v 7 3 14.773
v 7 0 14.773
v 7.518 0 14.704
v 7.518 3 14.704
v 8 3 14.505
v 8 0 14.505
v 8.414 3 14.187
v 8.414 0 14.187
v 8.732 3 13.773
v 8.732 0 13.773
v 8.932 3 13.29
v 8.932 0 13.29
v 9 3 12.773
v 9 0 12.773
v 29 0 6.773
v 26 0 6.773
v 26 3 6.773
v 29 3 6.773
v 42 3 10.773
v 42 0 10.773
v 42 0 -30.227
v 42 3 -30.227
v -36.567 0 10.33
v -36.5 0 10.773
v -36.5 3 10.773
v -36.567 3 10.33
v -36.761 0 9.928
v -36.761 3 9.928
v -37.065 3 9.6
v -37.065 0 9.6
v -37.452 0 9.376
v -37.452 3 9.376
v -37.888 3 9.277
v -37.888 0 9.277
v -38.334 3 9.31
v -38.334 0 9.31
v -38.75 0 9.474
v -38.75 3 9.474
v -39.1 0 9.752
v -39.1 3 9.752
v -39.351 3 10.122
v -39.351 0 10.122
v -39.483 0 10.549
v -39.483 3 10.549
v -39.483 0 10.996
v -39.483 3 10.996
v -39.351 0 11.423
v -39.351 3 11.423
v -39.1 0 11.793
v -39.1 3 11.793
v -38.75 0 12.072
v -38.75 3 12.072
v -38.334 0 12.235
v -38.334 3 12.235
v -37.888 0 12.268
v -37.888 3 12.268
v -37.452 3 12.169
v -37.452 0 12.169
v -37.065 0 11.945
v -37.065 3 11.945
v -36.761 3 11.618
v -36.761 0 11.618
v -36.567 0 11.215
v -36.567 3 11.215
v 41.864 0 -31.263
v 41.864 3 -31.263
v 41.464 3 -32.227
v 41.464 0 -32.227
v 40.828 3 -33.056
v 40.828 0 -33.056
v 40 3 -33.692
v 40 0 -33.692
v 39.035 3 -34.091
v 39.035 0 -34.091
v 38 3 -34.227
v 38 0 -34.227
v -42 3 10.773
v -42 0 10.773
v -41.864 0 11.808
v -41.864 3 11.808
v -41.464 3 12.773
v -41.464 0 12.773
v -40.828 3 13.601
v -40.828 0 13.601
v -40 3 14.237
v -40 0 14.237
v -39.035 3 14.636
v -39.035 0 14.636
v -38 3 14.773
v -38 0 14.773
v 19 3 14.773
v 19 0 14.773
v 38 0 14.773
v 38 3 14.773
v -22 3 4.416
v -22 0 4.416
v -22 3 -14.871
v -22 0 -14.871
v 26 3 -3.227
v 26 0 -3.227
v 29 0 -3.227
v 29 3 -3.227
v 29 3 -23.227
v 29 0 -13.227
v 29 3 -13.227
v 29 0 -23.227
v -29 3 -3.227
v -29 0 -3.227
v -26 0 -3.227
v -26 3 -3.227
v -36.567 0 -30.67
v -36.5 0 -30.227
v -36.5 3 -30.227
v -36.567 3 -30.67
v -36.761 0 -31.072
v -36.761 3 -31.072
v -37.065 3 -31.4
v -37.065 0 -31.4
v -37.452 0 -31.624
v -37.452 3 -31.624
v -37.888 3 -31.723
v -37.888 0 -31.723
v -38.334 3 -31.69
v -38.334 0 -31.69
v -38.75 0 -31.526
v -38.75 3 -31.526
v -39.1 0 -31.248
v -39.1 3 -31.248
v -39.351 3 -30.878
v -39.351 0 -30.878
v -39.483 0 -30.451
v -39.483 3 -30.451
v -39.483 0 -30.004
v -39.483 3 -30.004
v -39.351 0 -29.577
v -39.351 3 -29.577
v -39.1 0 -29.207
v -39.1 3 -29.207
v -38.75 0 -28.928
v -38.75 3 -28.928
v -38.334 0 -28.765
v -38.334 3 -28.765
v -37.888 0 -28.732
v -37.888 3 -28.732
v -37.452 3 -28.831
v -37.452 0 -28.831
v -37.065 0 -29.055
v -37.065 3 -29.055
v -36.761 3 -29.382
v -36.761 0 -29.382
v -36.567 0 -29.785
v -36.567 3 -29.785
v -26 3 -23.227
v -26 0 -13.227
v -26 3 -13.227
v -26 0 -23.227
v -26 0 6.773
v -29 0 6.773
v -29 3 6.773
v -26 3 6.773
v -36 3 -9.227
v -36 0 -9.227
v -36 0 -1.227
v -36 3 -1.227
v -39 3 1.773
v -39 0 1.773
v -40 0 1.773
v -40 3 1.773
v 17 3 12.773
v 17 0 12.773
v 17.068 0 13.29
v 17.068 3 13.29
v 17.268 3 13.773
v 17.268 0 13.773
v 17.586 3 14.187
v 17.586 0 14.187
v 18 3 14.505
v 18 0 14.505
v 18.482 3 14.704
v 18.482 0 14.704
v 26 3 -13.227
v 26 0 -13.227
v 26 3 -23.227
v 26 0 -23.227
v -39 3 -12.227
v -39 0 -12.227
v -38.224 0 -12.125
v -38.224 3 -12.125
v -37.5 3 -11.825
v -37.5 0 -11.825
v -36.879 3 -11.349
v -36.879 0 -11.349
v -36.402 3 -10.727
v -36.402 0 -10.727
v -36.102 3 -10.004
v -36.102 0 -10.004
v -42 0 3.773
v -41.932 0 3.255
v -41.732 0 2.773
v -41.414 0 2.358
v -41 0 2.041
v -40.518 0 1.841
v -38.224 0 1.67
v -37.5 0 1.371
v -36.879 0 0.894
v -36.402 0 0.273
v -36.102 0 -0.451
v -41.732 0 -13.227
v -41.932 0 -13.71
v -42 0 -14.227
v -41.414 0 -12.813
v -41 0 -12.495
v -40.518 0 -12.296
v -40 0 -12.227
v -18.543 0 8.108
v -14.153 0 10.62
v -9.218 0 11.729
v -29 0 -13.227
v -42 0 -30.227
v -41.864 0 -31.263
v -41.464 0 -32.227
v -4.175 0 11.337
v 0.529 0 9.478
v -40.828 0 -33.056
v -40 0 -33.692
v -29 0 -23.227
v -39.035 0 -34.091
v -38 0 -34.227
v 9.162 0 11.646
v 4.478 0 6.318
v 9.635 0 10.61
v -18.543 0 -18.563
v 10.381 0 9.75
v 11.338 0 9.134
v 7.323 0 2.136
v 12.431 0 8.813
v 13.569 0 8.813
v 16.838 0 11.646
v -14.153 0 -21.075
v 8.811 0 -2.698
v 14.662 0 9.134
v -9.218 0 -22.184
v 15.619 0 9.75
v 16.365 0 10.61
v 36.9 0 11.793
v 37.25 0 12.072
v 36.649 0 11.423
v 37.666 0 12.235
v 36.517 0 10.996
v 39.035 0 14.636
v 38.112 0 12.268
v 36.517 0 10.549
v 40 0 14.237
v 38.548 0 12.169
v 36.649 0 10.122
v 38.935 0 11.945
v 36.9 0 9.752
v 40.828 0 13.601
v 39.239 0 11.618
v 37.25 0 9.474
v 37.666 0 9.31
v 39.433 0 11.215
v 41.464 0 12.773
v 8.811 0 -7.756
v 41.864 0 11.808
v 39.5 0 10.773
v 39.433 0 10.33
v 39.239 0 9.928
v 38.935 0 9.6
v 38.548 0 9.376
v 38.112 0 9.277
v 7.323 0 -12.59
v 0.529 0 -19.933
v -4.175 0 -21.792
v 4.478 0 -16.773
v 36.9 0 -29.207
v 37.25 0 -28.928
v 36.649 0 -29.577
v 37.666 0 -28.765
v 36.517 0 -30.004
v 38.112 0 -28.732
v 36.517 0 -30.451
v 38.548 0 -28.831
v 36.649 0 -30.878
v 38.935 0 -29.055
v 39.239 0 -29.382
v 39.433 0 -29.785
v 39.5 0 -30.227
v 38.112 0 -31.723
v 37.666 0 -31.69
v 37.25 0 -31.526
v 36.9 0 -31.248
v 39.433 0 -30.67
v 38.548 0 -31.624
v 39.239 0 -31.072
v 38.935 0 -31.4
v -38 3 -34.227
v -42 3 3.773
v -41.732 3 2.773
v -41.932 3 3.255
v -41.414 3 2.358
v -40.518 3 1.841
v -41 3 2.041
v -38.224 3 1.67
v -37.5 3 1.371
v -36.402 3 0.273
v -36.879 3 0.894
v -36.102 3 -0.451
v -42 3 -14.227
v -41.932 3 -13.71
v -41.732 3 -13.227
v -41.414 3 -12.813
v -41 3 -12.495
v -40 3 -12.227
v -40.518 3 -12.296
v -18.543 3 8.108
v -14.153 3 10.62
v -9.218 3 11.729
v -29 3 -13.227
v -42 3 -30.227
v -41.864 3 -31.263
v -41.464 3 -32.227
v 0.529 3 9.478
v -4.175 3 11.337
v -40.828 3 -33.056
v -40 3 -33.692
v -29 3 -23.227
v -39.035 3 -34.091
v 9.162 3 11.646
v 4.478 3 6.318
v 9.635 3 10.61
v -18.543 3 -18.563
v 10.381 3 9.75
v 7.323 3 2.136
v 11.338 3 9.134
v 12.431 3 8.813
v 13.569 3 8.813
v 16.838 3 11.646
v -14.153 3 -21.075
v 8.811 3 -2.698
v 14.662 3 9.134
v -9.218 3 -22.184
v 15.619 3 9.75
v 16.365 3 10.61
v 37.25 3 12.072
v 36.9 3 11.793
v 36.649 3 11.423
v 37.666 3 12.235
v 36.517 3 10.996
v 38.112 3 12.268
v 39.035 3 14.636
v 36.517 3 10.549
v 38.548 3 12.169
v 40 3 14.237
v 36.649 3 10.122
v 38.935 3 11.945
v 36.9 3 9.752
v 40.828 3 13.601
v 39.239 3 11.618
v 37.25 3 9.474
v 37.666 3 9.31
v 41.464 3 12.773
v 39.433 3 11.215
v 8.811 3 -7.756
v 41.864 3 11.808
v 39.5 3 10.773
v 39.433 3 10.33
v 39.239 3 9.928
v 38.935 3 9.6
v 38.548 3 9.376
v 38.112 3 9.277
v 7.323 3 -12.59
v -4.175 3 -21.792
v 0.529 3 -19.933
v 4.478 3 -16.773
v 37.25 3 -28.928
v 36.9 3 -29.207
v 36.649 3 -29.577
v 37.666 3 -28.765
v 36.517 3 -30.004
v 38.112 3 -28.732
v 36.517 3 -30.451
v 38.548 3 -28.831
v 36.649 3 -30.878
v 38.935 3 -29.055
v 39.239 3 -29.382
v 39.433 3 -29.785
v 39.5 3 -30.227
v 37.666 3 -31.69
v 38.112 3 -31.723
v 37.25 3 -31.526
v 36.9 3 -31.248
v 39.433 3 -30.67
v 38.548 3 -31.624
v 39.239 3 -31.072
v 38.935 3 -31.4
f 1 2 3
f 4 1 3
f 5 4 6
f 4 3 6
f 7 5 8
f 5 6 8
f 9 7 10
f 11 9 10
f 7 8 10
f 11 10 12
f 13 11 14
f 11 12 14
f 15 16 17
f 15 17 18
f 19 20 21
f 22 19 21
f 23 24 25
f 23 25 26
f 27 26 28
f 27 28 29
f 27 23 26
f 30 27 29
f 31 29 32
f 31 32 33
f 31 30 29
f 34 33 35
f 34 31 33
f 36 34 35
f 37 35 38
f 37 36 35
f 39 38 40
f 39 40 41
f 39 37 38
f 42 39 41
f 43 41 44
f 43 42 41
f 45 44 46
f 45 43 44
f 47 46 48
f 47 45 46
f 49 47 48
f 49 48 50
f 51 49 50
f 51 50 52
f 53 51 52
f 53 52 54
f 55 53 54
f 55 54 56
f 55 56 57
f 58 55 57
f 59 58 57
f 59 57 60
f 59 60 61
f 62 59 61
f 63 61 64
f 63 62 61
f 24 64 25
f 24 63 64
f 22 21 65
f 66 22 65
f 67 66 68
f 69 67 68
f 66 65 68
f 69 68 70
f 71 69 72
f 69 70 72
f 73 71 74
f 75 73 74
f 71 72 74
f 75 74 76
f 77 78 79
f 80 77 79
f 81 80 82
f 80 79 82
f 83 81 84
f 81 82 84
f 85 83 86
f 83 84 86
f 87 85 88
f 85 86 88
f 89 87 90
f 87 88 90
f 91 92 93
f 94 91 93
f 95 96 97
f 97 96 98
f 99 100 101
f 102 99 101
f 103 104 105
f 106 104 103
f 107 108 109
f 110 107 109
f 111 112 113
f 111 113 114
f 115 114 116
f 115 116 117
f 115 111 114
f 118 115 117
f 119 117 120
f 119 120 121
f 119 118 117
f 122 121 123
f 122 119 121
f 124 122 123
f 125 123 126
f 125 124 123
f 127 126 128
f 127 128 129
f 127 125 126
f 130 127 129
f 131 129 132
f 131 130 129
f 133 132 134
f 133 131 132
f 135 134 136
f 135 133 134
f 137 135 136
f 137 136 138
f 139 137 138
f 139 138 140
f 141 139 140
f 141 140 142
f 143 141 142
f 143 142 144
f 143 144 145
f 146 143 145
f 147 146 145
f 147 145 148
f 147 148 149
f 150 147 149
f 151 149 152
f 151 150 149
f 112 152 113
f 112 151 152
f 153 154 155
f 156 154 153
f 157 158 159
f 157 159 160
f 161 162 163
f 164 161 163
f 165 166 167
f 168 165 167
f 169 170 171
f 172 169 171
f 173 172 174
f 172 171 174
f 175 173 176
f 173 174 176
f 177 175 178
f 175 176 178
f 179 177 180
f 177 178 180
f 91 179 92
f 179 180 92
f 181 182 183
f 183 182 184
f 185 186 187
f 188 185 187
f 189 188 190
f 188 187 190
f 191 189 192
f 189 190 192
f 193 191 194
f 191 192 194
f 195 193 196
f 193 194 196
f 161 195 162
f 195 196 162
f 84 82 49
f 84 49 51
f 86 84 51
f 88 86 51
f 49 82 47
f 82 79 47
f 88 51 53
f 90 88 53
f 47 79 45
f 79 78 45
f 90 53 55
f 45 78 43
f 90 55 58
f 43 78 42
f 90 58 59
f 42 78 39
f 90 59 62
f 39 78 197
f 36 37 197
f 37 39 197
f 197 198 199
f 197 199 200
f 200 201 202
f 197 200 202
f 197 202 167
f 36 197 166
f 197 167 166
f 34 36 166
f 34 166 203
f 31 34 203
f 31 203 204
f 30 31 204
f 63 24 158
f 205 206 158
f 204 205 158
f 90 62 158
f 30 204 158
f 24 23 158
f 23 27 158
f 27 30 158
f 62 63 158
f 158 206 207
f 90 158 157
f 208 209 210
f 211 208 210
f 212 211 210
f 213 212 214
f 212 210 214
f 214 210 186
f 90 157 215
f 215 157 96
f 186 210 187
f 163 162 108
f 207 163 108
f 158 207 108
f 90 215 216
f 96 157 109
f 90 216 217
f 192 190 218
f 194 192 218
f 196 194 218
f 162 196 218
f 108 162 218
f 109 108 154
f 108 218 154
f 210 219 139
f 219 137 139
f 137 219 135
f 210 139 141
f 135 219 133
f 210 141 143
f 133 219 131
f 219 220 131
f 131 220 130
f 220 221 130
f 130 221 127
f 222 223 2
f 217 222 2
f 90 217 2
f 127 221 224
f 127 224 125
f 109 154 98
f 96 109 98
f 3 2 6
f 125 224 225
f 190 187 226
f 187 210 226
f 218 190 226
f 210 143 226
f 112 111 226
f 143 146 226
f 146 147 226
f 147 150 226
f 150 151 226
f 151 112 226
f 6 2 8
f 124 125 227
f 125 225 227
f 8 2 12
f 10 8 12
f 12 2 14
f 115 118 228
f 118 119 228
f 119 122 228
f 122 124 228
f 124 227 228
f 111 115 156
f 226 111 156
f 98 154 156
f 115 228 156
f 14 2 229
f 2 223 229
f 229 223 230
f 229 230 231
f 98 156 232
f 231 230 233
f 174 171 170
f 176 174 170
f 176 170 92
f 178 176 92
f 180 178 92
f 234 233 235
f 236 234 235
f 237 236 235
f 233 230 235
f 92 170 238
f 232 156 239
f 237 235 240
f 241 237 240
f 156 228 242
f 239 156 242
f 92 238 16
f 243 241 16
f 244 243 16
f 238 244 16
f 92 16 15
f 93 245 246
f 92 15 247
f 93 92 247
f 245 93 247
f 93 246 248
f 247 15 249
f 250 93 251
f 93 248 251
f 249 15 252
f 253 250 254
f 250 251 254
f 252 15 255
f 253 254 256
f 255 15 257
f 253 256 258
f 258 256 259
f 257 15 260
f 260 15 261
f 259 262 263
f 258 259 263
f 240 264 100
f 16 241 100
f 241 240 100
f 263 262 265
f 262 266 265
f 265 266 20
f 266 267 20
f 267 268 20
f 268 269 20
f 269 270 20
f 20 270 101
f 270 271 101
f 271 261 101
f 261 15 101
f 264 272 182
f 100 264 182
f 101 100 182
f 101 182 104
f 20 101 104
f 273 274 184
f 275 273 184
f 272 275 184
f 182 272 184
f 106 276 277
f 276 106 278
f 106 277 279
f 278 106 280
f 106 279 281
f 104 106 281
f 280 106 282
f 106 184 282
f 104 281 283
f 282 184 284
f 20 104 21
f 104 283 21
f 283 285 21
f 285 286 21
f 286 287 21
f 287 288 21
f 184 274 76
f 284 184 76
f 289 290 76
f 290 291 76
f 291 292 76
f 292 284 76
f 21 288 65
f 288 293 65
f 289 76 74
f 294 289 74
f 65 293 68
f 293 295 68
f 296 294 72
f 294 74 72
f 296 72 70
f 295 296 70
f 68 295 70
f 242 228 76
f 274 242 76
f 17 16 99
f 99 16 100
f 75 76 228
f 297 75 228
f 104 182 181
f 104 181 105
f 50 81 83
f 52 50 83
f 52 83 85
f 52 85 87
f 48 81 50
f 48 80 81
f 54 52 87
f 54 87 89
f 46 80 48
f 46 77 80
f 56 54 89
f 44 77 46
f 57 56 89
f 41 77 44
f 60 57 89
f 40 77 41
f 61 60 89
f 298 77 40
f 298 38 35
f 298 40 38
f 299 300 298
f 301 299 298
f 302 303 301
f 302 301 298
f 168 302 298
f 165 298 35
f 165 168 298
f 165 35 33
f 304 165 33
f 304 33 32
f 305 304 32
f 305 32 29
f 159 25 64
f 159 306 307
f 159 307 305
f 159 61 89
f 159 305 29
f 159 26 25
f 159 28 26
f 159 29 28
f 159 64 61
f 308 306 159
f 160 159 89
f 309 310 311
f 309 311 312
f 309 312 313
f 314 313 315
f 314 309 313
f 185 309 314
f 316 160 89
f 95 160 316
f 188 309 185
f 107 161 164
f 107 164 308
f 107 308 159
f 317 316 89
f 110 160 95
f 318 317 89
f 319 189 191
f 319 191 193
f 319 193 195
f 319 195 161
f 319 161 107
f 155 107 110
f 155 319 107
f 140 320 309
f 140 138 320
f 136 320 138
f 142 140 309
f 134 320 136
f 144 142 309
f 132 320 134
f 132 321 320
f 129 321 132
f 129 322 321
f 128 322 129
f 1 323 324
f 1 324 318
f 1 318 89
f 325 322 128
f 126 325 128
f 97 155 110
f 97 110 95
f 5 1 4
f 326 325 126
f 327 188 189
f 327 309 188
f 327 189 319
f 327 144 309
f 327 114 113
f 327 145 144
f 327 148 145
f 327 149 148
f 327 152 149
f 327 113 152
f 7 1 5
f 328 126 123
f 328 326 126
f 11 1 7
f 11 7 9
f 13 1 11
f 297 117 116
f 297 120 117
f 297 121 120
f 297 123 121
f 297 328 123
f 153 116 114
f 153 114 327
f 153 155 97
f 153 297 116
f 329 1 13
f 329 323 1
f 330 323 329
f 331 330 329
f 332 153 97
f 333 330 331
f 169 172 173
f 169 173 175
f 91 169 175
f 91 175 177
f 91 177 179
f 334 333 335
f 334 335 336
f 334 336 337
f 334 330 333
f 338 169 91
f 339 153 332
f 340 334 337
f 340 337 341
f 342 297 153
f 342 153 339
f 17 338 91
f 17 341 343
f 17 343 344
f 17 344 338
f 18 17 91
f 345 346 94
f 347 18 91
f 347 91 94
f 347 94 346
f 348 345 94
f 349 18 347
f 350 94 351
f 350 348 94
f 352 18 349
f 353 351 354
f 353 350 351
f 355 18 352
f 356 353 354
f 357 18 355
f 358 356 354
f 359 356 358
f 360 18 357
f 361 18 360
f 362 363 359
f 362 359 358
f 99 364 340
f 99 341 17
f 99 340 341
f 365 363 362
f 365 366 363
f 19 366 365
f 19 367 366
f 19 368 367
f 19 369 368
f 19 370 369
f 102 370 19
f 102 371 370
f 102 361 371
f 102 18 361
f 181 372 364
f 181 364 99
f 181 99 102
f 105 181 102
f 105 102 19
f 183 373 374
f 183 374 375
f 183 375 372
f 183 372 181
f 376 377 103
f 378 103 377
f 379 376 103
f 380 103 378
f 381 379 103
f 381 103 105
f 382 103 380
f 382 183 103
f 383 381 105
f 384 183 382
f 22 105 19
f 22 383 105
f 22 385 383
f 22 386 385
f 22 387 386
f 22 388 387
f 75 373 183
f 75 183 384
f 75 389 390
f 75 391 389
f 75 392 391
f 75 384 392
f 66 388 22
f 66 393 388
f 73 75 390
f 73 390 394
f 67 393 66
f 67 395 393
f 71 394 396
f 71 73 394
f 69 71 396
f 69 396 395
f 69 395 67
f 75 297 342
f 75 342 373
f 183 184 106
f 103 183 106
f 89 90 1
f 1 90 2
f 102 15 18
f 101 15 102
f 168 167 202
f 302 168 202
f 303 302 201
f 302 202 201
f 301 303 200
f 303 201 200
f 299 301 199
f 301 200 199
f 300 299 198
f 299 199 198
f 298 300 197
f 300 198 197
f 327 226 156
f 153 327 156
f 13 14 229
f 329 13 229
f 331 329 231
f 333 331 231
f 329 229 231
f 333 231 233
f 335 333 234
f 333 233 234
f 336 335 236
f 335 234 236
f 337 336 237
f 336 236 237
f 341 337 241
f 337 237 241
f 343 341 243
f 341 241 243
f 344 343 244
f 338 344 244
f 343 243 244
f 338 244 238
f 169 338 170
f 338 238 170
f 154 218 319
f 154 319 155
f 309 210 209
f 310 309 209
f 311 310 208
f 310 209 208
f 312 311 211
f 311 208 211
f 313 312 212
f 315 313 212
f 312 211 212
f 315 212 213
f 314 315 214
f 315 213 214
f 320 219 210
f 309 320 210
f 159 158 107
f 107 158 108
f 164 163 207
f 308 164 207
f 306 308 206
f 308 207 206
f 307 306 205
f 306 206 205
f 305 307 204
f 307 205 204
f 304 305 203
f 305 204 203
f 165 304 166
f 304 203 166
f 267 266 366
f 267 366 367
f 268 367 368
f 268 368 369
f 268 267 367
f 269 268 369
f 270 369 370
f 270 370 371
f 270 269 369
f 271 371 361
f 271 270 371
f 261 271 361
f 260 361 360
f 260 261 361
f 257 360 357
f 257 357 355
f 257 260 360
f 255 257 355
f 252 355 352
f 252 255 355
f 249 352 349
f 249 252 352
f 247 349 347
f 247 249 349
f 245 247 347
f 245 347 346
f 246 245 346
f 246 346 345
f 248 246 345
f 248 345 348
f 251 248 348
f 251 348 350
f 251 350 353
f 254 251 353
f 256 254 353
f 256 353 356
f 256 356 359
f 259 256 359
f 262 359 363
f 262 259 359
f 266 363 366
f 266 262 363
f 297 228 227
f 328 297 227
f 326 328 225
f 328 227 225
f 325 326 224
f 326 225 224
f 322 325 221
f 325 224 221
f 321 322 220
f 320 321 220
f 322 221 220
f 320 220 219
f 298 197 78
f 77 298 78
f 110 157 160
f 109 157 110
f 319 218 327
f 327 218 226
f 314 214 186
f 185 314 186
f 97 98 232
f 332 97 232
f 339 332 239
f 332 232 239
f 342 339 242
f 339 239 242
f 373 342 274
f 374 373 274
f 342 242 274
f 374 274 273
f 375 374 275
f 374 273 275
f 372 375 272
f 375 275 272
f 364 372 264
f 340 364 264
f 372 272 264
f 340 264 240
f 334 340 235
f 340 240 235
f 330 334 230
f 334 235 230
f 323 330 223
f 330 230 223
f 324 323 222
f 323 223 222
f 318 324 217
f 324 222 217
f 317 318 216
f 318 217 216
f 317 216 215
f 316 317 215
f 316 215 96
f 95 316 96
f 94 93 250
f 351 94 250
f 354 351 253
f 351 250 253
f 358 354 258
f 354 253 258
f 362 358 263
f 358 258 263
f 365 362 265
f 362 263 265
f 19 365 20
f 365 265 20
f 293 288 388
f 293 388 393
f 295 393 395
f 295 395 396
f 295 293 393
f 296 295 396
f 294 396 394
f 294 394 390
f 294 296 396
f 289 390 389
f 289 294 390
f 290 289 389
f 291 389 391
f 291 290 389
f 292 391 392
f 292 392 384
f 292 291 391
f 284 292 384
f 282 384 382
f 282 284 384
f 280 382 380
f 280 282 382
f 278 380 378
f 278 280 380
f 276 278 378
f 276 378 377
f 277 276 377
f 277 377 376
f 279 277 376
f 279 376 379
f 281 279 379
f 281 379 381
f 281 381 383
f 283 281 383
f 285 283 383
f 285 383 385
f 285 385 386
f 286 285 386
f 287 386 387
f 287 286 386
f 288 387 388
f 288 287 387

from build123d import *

# Parameters (mm, degrees)
SKETCH1_R           = 1.5
SKETCH1_W           = 3
SKETCH1_H           = 10
BOSS_EXTRUDE2_DEPTH = 3


with BuildPart() as part:
    # Sketch1 → Boss-Extrude2 (new body)
    with BuildSketch(Plane(origin=(0, 0, 0), x_dir=(1, 0, 0), z_dir=(0, 1, 0))):
        with BuildLine():
            Line((-42, 30.22741889), (-42, 14.22741889))
            ThreePointArc((-42, 14.22741889), (-41.414213562, 12.813205328), (-40, 12.22741889))
            Line((-40, 12.22741889), (-39, 12.22741889))
            ThreePointArc((-39, 12.22741889), (-36.878679656, 11.348739234), (-36, 9.22741889))
            Line((-36, 9.22741889), (-36, 1.22741889))
            ThreePointArc((-36, 1.22741889), (-36.878679656, -0.893901454), (-39, -1.77258111))
            Line((-39, -1.77258111), (-40, -1.77258111))
            ThreePointArc((-40, -1.77258111), (-41.414213562, -2.358367548), (-42, -3.77258111))
            Line((-42, -3.77258111), (-42, -10.77258111))
            ThreePointArc((-42, -10.77258111), (-40.828427125, -13.601008235), (-38, -14.77258111))
            Line((-38, -14.77258111), (7, -14.77258111))
            ThreePointArc((7, -14.77258111), (8.414213562, -14.186794672), (9, -12.77258111))
            ThreePointArc((9, -12.77258111), (13, -8.77258111), (17, -12.77258111))
            ThreePointArc((17, -12.77258111), (17.585786438, -14.186794672), (19, -14.77258111))
            Line((19, -14.77258111), (38, -14.77258111))
            ThreePointArc((38, -14.77258111), (40.828427125, -13.601008235), (42, -10.77258111))
            Line((42, -10.77258111), (42, 30.22741889))
            ThreePointArc((42, 30.22741889), (40.828427125, 33.055846015), (38, 34.22741889))
            Line((38, 34.22741889), (-38, 34.22741889))
            ThreePointArc((-38, 34.22741889), (-40.828427125, 33.055846015), (-42, 30.22741889))
        make_face()
        with Locations((38, 30.22741889)):
            Circle(SKETCH1_R, mode=Mode.SUBTRACT)
        with Locations((38, -10.77258111)):
            Circle(SKETCH1_R, mode=Mode.SUBTRACT)
        with Locations((-38, -10.77258111)):
            Circle(SKETCH1_R, mode=Mode.SUBTRACT)
        with Locations((-38, 30.22741889)):
            Circle(SKETCH1_R, mode=Mode.SUBTRACT)
        with Locations((27.5, -1.77258111)):
            Rectangle(SKETCH1_W, SKETCH1_H, mode=Mode.SUBTRACT)
        with Locations((27.5, 18.22741889)):
            Rectangle(SKETCH1_W, SKETCH1_H, mode=Mode.SUBTRACT)
        with Locations((-27.5, 18.22741889)):
            Rectangle(SKETCH1_W, SKETCH1_H, mode=Mode.SUBTRACT)
        with Locations((-27.5, -1.77258111)):
            Rectangle(SKETCH1_W, SKETCH1_H, mode=Mode.SUBTRACT)
        with BuildLine():
            Line((-22, -4.416231871), (-22, 14.871069651))
            ThreePointArc((-22, 14.871069651), (9, 5.22741889), (-22, -4.416231871))
        make_face(mode=Mode.SUBTRACT)
    extrude(amount=BOSS_EXTRUDE2_DEPTH)


solid = part.part
